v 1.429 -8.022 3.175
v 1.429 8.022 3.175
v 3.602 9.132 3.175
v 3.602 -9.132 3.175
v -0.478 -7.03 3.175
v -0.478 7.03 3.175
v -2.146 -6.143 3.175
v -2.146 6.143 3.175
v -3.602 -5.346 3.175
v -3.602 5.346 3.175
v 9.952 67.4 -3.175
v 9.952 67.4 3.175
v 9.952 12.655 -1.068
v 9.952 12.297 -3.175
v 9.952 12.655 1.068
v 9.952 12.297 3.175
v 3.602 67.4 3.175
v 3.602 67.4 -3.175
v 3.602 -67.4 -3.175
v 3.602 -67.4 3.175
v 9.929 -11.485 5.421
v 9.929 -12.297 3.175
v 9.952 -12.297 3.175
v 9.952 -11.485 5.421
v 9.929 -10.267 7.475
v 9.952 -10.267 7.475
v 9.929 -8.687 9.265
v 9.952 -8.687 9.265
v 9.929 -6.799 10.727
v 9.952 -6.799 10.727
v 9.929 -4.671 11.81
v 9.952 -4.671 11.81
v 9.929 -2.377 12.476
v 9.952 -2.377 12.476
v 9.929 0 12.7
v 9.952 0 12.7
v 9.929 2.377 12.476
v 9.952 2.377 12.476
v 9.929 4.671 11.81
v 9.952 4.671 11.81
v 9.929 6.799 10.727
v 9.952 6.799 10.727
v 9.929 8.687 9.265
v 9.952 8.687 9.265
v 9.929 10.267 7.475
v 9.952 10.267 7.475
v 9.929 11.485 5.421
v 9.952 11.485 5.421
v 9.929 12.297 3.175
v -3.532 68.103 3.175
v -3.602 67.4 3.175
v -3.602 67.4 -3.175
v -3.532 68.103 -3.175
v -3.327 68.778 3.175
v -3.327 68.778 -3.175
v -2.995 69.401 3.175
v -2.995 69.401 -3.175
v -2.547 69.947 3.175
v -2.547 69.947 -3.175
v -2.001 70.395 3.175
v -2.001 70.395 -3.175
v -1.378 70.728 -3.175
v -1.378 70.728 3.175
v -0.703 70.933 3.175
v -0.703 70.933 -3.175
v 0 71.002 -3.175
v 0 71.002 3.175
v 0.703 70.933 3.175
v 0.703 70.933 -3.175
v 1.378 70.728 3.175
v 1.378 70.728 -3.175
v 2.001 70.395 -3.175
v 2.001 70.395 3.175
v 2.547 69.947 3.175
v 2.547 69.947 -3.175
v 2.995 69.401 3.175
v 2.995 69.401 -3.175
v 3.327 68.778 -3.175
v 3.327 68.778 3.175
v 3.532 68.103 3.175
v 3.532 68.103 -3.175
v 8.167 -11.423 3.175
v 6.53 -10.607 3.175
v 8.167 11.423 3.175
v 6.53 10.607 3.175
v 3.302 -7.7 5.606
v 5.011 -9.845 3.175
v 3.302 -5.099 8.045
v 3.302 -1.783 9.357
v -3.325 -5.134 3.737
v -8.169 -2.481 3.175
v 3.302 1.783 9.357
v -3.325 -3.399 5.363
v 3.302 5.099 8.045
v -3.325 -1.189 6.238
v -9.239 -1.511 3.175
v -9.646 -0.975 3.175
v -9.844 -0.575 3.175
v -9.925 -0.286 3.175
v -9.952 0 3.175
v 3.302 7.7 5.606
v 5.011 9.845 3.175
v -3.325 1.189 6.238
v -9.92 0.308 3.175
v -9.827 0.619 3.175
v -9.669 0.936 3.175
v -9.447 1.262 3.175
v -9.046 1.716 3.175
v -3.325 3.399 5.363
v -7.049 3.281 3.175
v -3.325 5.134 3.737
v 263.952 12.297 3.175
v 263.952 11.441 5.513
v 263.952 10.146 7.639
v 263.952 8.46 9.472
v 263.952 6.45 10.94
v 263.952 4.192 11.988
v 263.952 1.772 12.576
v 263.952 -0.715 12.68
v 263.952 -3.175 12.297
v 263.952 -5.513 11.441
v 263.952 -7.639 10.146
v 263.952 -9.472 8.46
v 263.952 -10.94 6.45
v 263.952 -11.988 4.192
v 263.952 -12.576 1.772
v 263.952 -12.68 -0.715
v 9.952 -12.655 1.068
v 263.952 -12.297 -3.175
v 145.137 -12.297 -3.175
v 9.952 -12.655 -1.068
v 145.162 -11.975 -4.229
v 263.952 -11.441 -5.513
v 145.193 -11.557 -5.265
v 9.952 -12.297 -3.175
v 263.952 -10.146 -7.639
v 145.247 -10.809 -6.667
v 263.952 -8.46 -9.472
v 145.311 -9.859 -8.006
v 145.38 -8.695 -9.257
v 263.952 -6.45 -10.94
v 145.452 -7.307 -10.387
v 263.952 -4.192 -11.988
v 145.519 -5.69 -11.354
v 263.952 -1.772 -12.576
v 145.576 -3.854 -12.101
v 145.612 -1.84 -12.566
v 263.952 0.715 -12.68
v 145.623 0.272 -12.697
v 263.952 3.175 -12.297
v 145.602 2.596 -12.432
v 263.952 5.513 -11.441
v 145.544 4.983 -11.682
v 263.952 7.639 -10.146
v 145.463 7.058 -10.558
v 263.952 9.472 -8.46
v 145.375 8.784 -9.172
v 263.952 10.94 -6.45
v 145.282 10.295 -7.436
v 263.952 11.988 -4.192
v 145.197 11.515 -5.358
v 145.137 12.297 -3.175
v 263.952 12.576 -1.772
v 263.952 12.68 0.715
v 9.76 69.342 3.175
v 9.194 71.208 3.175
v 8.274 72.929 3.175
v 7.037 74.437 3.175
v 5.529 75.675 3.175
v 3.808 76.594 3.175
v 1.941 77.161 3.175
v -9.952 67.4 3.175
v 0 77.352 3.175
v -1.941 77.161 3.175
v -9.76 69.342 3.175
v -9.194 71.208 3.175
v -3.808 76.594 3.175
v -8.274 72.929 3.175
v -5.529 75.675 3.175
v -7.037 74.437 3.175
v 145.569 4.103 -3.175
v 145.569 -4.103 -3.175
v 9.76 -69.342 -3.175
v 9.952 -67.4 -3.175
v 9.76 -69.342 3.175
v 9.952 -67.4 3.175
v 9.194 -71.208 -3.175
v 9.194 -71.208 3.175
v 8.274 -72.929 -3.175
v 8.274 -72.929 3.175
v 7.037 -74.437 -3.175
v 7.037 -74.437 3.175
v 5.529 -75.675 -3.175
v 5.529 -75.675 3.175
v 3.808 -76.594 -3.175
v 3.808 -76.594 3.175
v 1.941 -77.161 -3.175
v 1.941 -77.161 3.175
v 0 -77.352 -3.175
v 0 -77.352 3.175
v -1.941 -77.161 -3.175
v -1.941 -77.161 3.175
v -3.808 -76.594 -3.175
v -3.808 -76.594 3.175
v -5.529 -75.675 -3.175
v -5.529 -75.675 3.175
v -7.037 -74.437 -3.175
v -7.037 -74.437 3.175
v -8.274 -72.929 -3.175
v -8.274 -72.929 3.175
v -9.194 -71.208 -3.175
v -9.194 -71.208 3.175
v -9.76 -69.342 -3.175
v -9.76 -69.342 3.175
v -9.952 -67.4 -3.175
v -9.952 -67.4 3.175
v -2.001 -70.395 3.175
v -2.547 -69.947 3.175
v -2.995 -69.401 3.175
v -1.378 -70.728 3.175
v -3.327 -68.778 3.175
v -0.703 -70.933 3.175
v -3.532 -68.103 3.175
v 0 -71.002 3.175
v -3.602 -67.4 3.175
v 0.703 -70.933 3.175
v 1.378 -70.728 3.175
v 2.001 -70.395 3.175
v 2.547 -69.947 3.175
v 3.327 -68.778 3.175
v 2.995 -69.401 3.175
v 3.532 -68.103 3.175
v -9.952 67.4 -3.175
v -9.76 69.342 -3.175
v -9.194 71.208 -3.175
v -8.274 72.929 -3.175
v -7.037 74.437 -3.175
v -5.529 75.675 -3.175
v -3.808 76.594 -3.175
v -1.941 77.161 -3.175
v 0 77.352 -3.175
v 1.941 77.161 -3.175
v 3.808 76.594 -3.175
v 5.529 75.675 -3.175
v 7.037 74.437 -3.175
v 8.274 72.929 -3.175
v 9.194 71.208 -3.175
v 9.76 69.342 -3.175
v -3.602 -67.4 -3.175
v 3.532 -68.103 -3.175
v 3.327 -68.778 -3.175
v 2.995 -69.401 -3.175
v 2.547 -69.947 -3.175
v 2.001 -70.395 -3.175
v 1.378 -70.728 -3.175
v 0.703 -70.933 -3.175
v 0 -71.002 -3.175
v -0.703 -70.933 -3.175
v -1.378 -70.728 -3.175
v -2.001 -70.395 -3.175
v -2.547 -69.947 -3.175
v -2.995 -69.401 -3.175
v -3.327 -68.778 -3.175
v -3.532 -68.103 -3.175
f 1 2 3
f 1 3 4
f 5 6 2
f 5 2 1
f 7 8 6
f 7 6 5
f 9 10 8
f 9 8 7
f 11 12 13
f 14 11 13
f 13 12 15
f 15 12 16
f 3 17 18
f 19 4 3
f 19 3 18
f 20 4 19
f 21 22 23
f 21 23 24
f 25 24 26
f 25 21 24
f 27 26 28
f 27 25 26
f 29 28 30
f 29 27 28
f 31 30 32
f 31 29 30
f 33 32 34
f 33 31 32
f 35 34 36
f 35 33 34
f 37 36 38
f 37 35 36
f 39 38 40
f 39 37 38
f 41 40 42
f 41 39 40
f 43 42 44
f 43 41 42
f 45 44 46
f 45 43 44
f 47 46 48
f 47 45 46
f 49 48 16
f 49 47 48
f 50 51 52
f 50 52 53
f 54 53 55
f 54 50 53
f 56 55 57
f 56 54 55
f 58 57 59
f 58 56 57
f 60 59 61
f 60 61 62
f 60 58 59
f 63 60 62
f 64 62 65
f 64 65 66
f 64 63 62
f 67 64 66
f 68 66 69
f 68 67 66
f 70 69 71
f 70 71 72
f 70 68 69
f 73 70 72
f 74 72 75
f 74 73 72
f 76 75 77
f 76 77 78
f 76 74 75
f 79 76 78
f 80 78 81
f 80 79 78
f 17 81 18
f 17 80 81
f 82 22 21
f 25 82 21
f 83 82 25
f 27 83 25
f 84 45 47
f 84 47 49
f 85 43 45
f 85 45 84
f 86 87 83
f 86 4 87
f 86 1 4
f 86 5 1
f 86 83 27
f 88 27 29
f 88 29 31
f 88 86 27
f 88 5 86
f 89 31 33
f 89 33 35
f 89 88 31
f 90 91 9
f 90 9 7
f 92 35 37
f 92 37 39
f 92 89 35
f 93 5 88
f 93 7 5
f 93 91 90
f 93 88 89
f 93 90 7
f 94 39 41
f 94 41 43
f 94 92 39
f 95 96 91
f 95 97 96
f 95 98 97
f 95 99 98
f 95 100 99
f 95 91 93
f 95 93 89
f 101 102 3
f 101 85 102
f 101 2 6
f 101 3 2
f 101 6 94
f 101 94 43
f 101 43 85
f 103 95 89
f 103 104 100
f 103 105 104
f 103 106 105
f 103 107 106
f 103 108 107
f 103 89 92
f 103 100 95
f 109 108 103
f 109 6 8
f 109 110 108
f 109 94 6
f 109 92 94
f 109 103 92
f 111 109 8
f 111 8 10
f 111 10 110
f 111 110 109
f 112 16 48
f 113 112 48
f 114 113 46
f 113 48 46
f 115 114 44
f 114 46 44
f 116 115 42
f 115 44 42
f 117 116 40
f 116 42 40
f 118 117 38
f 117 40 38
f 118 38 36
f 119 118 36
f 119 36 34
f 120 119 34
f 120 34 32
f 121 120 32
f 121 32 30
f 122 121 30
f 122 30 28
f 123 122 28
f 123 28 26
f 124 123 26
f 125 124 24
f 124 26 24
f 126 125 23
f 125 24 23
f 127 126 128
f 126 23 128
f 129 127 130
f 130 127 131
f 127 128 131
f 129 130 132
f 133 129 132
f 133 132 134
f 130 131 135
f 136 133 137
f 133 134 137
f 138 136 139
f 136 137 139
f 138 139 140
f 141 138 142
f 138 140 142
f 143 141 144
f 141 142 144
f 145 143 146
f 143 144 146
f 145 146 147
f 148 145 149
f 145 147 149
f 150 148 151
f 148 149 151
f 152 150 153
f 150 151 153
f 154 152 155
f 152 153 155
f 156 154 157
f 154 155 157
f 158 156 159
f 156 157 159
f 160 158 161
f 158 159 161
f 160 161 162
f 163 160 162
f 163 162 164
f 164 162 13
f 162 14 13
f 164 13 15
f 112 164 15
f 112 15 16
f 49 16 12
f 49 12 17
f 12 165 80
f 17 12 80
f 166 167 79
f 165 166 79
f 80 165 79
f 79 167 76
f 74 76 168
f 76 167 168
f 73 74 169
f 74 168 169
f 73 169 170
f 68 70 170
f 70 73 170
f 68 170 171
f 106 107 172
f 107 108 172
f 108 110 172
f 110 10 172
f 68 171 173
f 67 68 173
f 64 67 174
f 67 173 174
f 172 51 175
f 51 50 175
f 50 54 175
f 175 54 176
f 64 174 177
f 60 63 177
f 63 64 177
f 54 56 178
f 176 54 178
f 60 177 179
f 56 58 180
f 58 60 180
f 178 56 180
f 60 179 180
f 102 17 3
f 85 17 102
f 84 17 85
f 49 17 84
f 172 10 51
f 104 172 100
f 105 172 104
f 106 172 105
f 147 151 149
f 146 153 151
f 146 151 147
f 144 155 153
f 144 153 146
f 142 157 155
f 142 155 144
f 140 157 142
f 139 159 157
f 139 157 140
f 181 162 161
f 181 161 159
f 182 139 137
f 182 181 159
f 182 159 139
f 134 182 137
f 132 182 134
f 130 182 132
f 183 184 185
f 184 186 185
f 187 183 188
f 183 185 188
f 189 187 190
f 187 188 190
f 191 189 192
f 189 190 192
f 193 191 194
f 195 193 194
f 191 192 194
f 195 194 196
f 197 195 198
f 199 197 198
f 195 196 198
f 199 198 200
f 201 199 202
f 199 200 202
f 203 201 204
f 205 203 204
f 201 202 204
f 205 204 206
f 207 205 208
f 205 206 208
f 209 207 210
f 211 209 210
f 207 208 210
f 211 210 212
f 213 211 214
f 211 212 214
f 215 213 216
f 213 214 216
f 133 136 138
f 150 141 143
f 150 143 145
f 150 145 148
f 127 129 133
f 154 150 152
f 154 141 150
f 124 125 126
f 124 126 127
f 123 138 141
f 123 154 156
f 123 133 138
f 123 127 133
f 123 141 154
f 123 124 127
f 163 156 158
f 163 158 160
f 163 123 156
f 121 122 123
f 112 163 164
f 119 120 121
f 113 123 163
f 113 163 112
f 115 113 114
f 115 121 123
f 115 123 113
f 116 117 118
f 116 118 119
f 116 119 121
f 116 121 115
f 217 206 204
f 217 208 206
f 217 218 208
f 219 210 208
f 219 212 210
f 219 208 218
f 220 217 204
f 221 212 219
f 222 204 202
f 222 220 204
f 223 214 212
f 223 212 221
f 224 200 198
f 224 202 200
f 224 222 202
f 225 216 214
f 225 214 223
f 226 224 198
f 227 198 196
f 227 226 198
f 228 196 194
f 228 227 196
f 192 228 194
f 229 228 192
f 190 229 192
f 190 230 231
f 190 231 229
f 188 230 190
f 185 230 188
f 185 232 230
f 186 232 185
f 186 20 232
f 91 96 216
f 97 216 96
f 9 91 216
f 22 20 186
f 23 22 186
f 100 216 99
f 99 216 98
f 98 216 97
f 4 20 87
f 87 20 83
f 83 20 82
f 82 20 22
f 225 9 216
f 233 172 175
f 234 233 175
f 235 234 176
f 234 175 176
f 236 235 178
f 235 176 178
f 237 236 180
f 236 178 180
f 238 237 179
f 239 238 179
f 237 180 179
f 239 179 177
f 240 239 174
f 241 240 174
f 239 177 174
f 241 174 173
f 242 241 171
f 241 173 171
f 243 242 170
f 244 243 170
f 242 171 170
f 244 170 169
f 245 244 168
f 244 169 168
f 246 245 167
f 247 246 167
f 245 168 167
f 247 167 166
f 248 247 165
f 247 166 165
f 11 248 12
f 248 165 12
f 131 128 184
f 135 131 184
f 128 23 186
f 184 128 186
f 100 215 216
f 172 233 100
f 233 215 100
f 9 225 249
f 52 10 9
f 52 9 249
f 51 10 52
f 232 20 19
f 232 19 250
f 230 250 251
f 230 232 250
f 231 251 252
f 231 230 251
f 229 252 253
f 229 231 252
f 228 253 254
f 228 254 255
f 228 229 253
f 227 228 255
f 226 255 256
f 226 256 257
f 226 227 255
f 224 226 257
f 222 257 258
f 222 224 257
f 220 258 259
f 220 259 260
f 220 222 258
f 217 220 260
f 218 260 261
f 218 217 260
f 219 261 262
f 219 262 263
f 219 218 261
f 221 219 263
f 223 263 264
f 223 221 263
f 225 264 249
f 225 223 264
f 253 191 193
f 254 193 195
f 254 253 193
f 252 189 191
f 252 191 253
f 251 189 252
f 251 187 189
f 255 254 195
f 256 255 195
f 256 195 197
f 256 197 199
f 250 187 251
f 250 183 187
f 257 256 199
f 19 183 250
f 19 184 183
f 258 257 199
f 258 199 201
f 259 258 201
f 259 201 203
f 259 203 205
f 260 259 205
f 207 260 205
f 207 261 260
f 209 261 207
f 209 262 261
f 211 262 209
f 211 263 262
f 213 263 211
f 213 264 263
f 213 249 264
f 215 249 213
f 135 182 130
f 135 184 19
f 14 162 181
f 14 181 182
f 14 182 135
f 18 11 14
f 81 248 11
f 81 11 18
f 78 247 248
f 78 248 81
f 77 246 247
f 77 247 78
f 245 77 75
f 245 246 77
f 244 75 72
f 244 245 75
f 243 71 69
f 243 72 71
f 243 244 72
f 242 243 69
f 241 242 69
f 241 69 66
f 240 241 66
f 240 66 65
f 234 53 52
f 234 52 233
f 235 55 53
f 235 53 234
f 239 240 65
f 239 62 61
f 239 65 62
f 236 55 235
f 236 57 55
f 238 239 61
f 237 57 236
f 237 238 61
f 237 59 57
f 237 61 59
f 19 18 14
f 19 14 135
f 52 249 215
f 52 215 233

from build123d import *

# Parameters (mm, degrees)
BOSS_EXTRUDE1_DEPTH = 3.175
SKETCH2_R           = 12.7
BOSS_EXTRUDE2_DEPTH = 254
BOSS_EXTRUDE3_START = 19.90327871
BOSS_EXTRUDE3_DEPTH = 19.90327871
SKETCH15_W          = 9.525
SKETCH15_H          = 155.575
CHAMFER1_SIZE       = 19.880208588
CHAMFER1_SIZE_2     = 9.525


with BuildPart() as part:
    # Sketch1 → Boss-Extrude1 (new, symmetric)
    with BuildSketch(Plane.XY):
        with BuildLine():
            Line((9.951639355, 67.400163523), (9.951639355, -67.400163523))
            ThreePointArc((9.951639355, -67.400163523), (0, -77.351802878), (-9.951639355, -67.400163523))
            Line((-9.951639355, -67.400163523), (-9.951639355, 67.400163523))
            ThreePointArc((-9.951639355, 67.400163523), (0, 77.351802878), (9.951639355, 67.400163523))
        make_face()
        with BuildLine():
            Line((3.601639355, 67.400163523), (3.601639355, -67.400163523))
            ThreePointArc((3.601639355, -67.400163523), (0, -71.001802878), (-3.601639355, -67.400163523))
            Line((-3.601639355, -67.400163523), (-3.601639355, 67.400163523))
            ThreePointArc((-3.601639355, 67.400163523), (0, 71.001802878), (3.601639355, 67.400163523))
        make_face(mode=Mode.SUBTRACT)
    extrude(amount=BOSS_EXTRUDE1_DEPTH, both=True)

    # Sketch2 → Boss-Extrude2 (add)
    with BuildSketch(Plane(origin=(9.951639355, 0, 0), x_dir=(0, 0, -1), z_dir=(1, 0, 0))):
        with Locations(Location((0, 0, 0), (0, 0, 104.477512186))):
            Circle(SKETCH2_R)
    extrude(amount=BOSS_EXTRUDE2_DEPTH)

    # Sketch5 → Boss-Extrude3 (add)
    with BuildSketch(Plane.ZY.offset(-9.951639355).offset(BOSS_EXTRUDE3_START)):
        with BuildLine():
            Line((-3.175, -12.296722124), (-3.175, 12.296722124))
            ThreePointArc((-3.175, 12.296722124), (-12.7, 0), (-3.175, -12.296722124))
        make_face()
        with BuildLine():
            Line((3.175, 12.296722124), (3.175, -12.296722124))
            ThreePointArc((3.175, -12.296722124), (12.7, 0), (3.175, 12.296722124))
        make_face()
    extrude(amount=-BOSS_EXTRUDE3_DEPTH)

    # Sketch15 → Cut-Revolve2 (revolve, cut)
    with BuildSketch(Plane.ZY.offset(9.951639355)):
        with Locations((-7.9375, 77.7875)):
            Rectangle(SKETCH15_W, SKETCH15_H)
    revolve(axis=Axis((-9.951639355, 0, -3.175), (0, 0, -1)), mode=Mode.SUBTRACT)

    # Chamfer1
    # the kernel refuses this chamfer: 19.880208588, 9.525 mm, written as the material it takes off along each edge
    with BuildSketch(Plane(origin=(-9.951639355, 0, 0), x_dir=(0, -0.003141587485879782, -0.9999950652018581), z_dir=(0, 0.9999950652018581, -0.003141587485879782))) as chamfer1_piece_1_section:
        Polygon((12.7, -CHAMFER1_SIZE), (12.7 - CHAMFER1_SIZE_2, 0), (12.7, 0), align=None)
    chamfer1_piece_1 = revolve(axis=Axis((-9.951639355, 0, 0), (-1, 0, 0)), revolution_arc=359.64, mode=Mode.PRIVATE)
    chamfer1_piece_1 = split(chamfer1_piece_1, bisect_by=Plane(origin=(-9.951639355, 0, 3.175), z_dir=(0, 0, 1)), keep=Keep.TOP, mode=Mode.PRIVATE)
    add(chamfer1_piece_1, mode=Mode.SUBTRACT)


solid = part.part
